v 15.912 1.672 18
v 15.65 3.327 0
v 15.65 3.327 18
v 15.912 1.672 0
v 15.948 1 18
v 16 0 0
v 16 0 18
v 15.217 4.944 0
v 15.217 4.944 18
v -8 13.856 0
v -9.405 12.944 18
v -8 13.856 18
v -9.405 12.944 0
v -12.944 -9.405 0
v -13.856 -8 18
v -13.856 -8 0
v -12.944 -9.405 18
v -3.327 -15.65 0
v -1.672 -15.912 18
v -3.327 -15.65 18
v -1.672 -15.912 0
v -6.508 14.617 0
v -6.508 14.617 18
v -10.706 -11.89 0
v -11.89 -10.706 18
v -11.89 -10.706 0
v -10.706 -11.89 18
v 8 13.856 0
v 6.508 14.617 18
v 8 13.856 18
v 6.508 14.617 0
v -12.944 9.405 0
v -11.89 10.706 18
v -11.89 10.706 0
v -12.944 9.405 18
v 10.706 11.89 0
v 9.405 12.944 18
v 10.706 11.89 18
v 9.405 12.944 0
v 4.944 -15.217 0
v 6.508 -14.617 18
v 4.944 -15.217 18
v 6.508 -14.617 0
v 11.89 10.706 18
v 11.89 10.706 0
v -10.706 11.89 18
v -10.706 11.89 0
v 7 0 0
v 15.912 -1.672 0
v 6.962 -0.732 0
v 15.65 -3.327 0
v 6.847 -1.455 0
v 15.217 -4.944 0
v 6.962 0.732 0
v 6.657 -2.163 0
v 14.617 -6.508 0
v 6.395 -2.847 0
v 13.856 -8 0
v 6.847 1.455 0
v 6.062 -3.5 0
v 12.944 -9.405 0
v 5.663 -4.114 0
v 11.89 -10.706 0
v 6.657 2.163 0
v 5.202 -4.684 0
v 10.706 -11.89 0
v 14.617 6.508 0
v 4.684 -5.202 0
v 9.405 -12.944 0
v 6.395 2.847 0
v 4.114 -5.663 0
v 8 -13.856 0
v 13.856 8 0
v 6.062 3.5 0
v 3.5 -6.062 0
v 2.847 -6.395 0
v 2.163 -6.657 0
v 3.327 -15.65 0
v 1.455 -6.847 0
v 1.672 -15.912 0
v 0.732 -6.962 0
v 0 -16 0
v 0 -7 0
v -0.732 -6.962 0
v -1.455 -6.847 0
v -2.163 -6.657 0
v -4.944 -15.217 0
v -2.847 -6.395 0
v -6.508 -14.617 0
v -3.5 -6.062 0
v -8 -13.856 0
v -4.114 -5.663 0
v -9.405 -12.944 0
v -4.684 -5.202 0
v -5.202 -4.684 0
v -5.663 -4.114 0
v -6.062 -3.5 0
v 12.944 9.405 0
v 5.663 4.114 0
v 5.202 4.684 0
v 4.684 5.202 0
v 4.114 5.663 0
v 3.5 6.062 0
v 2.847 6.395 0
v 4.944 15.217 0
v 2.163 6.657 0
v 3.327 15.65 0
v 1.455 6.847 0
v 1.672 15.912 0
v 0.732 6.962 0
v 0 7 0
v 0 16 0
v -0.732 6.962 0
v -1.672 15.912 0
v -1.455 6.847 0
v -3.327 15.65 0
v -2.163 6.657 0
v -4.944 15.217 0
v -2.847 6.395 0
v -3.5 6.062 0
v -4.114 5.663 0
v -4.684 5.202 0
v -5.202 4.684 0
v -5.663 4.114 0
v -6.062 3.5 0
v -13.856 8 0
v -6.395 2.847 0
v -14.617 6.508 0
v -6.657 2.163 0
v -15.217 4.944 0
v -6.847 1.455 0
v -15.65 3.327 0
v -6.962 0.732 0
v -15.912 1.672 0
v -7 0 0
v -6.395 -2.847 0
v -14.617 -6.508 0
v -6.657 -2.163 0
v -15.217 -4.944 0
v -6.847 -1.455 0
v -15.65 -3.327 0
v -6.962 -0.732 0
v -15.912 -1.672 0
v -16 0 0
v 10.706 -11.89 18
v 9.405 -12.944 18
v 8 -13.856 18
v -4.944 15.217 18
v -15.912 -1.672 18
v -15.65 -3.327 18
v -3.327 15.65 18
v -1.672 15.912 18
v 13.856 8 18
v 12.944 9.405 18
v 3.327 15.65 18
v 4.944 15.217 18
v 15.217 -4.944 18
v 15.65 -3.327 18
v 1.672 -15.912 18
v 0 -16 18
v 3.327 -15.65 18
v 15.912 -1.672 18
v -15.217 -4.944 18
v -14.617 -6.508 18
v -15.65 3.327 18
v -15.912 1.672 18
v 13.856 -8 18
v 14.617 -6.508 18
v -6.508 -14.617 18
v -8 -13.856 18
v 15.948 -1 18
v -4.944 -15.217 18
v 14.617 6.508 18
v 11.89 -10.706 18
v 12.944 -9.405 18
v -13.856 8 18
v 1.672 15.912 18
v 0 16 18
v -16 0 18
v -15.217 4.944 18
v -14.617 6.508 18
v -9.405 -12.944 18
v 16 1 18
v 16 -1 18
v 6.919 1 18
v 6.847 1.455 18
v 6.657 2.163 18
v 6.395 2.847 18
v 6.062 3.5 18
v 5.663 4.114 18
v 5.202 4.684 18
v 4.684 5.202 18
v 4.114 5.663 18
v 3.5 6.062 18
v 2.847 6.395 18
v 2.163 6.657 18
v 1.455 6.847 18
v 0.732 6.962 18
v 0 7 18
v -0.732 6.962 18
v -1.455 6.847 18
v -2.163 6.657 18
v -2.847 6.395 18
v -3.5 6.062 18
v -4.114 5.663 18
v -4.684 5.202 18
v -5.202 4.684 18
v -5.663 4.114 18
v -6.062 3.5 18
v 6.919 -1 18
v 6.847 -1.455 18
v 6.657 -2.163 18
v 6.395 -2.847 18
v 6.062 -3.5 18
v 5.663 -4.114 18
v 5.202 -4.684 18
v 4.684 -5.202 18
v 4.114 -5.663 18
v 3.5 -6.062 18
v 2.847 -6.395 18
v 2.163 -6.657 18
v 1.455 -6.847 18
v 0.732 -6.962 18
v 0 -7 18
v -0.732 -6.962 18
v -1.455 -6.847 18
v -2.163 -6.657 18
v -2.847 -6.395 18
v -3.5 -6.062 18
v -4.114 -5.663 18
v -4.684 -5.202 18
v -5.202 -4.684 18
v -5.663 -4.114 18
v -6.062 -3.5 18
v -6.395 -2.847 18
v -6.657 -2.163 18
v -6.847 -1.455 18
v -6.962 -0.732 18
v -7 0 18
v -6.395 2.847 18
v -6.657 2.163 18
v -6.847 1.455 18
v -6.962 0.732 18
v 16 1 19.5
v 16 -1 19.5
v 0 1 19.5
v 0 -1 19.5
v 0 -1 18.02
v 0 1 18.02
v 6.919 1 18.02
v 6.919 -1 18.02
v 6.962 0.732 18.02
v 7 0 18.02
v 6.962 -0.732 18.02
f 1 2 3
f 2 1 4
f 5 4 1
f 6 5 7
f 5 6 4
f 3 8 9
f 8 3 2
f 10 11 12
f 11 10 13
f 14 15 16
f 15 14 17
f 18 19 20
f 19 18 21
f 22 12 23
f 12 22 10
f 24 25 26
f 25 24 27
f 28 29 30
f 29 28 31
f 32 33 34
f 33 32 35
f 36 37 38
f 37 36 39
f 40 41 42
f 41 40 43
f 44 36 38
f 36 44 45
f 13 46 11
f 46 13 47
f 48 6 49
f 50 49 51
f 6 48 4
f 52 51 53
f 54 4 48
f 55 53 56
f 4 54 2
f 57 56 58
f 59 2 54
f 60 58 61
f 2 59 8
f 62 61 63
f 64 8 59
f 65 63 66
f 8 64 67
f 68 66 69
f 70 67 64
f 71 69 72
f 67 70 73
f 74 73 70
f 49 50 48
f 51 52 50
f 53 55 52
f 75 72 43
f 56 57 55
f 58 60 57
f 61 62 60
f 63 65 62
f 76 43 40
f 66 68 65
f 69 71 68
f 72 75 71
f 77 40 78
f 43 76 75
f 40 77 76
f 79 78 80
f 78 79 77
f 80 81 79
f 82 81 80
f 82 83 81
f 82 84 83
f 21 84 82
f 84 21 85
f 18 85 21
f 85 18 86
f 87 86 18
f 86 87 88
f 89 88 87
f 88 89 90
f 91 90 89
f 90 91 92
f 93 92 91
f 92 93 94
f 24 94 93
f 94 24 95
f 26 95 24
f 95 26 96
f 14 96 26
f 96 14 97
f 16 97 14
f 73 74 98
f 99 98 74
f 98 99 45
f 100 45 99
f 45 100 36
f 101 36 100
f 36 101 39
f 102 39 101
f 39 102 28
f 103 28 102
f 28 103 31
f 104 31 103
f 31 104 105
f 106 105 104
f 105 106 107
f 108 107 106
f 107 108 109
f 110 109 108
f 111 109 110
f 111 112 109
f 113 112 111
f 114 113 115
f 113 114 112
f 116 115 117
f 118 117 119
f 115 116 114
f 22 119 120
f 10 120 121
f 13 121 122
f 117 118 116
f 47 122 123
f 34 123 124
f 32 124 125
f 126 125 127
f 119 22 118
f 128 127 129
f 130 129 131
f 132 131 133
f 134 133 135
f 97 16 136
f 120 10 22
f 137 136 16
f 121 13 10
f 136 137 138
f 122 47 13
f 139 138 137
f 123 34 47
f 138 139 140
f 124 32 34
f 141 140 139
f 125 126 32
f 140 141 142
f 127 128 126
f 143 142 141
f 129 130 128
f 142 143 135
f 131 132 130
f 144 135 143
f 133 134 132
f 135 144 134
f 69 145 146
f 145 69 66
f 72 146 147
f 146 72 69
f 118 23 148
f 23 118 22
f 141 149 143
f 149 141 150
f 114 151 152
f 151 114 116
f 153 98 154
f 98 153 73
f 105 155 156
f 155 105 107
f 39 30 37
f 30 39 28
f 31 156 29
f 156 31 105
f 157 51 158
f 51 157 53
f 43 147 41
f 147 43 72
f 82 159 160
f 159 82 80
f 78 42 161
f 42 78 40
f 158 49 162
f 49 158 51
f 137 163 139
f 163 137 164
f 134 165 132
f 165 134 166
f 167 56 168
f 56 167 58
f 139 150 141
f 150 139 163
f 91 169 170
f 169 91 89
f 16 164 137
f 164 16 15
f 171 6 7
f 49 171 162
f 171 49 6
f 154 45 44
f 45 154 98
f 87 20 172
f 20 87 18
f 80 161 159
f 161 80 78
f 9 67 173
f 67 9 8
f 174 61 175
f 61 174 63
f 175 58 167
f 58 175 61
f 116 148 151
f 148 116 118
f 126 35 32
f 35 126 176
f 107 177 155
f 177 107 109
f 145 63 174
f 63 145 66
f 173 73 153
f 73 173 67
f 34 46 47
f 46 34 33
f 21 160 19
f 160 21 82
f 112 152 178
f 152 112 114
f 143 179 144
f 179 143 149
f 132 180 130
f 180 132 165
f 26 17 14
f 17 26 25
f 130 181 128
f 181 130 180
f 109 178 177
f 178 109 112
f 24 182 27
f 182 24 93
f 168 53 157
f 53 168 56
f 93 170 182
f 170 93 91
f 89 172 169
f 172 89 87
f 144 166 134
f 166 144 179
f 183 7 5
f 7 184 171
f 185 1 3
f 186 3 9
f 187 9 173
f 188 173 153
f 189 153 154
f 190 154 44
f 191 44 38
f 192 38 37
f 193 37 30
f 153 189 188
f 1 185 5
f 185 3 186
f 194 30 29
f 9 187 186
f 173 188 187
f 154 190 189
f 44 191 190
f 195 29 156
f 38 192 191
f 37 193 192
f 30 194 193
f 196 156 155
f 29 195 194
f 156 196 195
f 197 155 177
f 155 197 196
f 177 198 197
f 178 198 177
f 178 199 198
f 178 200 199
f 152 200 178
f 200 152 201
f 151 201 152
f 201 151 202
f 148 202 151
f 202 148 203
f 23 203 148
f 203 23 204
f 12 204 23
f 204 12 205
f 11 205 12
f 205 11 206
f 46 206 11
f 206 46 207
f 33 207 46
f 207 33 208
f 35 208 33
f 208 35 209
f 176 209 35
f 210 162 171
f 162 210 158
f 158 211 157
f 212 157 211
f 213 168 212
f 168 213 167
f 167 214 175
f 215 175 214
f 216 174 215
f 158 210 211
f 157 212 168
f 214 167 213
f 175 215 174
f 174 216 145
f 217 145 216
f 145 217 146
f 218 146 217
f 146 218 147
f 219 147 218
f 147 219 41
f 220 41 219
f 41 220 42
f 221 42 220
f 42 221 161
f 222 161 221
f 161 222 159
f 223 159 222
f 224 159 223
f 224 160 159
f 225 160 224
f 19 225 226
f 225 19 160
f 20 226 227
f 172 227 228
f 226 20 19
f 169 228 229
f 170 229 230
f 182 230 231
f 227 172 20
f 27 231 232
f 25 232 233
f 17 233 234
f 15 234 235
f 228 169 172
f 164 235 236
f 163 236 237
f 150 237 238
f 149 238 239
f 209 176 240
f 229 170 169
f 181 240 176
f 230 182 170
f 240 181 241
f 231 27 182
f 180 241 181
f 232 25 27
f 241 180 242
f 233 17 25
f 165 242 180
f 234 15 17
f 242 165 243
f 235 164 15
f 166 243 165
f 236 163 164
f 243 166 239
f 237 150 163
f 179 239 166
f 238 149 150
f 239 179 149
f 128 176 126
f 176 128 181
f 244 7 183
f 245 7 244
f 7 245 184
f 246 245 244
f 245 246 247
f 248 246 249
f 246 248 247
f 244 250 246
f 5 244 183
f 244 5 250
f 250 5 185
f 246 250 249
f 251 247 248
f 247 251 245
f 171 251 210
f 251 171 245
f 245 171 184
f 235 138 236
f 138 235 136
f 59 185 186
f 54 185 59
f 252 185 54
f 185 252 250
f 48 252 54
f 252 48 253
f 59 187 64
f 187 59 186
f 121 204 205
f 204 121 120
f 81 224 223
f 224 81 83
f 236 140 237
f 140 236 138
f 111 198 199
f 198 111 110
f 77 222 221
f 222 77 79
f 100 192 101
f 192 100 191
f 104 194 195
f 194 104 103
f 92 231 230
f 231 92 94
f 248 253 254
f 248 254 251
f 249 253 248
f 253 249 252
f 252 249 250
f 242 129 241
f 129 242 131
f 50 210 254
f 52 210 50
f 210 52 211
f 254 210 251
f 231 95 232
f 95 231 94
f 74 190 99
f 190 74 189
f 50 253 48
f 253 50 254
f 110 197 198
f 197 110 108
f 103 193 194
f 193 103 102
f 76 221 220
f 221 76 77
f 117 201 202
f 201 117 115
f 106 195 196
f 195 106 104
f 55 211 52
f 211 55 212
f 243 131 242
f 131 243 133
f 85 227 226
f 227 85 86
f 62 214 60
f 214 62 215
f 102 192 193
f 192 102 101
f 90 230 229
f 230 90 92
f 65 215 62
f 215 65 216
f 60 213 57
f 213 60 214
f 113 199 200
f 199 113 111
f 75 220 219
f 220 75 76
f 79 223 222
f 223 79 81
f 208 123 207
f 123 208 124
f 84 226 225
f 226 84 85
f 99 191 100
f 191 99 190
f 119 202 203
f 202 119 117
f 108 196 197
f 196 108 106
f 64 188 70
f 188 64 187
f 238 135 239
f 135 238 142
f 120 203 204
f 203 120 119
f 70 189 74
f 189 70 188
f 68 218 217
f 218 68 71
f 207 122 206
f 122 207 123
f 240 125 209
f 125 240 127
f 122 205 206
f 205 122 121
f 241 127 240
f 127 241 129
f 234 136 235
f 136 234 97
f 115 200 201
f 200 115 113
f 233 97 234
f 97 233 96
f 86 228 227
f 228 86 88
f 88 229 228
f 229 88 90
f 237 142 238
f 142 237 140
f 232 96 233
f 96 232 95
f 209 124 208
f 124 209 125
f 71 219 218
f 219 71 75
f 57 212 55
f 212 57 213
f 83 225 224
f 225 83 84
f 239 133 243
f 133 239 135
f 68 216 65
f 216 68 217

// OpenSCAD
// Pointer control knob.
$fn = 60;
eps = 0.02;
bore_d = 14;
knob_d = 32;
knob_h = 18;
difference() { union() { cylinder(d=knob_d,h=knob_h); translate([0,-1,knob_h]) cube([knob_d/2,2,1.5]); } translate([0,0,-eps]) cylinder(d=bore_d,h=knob_h+2*eps); }
